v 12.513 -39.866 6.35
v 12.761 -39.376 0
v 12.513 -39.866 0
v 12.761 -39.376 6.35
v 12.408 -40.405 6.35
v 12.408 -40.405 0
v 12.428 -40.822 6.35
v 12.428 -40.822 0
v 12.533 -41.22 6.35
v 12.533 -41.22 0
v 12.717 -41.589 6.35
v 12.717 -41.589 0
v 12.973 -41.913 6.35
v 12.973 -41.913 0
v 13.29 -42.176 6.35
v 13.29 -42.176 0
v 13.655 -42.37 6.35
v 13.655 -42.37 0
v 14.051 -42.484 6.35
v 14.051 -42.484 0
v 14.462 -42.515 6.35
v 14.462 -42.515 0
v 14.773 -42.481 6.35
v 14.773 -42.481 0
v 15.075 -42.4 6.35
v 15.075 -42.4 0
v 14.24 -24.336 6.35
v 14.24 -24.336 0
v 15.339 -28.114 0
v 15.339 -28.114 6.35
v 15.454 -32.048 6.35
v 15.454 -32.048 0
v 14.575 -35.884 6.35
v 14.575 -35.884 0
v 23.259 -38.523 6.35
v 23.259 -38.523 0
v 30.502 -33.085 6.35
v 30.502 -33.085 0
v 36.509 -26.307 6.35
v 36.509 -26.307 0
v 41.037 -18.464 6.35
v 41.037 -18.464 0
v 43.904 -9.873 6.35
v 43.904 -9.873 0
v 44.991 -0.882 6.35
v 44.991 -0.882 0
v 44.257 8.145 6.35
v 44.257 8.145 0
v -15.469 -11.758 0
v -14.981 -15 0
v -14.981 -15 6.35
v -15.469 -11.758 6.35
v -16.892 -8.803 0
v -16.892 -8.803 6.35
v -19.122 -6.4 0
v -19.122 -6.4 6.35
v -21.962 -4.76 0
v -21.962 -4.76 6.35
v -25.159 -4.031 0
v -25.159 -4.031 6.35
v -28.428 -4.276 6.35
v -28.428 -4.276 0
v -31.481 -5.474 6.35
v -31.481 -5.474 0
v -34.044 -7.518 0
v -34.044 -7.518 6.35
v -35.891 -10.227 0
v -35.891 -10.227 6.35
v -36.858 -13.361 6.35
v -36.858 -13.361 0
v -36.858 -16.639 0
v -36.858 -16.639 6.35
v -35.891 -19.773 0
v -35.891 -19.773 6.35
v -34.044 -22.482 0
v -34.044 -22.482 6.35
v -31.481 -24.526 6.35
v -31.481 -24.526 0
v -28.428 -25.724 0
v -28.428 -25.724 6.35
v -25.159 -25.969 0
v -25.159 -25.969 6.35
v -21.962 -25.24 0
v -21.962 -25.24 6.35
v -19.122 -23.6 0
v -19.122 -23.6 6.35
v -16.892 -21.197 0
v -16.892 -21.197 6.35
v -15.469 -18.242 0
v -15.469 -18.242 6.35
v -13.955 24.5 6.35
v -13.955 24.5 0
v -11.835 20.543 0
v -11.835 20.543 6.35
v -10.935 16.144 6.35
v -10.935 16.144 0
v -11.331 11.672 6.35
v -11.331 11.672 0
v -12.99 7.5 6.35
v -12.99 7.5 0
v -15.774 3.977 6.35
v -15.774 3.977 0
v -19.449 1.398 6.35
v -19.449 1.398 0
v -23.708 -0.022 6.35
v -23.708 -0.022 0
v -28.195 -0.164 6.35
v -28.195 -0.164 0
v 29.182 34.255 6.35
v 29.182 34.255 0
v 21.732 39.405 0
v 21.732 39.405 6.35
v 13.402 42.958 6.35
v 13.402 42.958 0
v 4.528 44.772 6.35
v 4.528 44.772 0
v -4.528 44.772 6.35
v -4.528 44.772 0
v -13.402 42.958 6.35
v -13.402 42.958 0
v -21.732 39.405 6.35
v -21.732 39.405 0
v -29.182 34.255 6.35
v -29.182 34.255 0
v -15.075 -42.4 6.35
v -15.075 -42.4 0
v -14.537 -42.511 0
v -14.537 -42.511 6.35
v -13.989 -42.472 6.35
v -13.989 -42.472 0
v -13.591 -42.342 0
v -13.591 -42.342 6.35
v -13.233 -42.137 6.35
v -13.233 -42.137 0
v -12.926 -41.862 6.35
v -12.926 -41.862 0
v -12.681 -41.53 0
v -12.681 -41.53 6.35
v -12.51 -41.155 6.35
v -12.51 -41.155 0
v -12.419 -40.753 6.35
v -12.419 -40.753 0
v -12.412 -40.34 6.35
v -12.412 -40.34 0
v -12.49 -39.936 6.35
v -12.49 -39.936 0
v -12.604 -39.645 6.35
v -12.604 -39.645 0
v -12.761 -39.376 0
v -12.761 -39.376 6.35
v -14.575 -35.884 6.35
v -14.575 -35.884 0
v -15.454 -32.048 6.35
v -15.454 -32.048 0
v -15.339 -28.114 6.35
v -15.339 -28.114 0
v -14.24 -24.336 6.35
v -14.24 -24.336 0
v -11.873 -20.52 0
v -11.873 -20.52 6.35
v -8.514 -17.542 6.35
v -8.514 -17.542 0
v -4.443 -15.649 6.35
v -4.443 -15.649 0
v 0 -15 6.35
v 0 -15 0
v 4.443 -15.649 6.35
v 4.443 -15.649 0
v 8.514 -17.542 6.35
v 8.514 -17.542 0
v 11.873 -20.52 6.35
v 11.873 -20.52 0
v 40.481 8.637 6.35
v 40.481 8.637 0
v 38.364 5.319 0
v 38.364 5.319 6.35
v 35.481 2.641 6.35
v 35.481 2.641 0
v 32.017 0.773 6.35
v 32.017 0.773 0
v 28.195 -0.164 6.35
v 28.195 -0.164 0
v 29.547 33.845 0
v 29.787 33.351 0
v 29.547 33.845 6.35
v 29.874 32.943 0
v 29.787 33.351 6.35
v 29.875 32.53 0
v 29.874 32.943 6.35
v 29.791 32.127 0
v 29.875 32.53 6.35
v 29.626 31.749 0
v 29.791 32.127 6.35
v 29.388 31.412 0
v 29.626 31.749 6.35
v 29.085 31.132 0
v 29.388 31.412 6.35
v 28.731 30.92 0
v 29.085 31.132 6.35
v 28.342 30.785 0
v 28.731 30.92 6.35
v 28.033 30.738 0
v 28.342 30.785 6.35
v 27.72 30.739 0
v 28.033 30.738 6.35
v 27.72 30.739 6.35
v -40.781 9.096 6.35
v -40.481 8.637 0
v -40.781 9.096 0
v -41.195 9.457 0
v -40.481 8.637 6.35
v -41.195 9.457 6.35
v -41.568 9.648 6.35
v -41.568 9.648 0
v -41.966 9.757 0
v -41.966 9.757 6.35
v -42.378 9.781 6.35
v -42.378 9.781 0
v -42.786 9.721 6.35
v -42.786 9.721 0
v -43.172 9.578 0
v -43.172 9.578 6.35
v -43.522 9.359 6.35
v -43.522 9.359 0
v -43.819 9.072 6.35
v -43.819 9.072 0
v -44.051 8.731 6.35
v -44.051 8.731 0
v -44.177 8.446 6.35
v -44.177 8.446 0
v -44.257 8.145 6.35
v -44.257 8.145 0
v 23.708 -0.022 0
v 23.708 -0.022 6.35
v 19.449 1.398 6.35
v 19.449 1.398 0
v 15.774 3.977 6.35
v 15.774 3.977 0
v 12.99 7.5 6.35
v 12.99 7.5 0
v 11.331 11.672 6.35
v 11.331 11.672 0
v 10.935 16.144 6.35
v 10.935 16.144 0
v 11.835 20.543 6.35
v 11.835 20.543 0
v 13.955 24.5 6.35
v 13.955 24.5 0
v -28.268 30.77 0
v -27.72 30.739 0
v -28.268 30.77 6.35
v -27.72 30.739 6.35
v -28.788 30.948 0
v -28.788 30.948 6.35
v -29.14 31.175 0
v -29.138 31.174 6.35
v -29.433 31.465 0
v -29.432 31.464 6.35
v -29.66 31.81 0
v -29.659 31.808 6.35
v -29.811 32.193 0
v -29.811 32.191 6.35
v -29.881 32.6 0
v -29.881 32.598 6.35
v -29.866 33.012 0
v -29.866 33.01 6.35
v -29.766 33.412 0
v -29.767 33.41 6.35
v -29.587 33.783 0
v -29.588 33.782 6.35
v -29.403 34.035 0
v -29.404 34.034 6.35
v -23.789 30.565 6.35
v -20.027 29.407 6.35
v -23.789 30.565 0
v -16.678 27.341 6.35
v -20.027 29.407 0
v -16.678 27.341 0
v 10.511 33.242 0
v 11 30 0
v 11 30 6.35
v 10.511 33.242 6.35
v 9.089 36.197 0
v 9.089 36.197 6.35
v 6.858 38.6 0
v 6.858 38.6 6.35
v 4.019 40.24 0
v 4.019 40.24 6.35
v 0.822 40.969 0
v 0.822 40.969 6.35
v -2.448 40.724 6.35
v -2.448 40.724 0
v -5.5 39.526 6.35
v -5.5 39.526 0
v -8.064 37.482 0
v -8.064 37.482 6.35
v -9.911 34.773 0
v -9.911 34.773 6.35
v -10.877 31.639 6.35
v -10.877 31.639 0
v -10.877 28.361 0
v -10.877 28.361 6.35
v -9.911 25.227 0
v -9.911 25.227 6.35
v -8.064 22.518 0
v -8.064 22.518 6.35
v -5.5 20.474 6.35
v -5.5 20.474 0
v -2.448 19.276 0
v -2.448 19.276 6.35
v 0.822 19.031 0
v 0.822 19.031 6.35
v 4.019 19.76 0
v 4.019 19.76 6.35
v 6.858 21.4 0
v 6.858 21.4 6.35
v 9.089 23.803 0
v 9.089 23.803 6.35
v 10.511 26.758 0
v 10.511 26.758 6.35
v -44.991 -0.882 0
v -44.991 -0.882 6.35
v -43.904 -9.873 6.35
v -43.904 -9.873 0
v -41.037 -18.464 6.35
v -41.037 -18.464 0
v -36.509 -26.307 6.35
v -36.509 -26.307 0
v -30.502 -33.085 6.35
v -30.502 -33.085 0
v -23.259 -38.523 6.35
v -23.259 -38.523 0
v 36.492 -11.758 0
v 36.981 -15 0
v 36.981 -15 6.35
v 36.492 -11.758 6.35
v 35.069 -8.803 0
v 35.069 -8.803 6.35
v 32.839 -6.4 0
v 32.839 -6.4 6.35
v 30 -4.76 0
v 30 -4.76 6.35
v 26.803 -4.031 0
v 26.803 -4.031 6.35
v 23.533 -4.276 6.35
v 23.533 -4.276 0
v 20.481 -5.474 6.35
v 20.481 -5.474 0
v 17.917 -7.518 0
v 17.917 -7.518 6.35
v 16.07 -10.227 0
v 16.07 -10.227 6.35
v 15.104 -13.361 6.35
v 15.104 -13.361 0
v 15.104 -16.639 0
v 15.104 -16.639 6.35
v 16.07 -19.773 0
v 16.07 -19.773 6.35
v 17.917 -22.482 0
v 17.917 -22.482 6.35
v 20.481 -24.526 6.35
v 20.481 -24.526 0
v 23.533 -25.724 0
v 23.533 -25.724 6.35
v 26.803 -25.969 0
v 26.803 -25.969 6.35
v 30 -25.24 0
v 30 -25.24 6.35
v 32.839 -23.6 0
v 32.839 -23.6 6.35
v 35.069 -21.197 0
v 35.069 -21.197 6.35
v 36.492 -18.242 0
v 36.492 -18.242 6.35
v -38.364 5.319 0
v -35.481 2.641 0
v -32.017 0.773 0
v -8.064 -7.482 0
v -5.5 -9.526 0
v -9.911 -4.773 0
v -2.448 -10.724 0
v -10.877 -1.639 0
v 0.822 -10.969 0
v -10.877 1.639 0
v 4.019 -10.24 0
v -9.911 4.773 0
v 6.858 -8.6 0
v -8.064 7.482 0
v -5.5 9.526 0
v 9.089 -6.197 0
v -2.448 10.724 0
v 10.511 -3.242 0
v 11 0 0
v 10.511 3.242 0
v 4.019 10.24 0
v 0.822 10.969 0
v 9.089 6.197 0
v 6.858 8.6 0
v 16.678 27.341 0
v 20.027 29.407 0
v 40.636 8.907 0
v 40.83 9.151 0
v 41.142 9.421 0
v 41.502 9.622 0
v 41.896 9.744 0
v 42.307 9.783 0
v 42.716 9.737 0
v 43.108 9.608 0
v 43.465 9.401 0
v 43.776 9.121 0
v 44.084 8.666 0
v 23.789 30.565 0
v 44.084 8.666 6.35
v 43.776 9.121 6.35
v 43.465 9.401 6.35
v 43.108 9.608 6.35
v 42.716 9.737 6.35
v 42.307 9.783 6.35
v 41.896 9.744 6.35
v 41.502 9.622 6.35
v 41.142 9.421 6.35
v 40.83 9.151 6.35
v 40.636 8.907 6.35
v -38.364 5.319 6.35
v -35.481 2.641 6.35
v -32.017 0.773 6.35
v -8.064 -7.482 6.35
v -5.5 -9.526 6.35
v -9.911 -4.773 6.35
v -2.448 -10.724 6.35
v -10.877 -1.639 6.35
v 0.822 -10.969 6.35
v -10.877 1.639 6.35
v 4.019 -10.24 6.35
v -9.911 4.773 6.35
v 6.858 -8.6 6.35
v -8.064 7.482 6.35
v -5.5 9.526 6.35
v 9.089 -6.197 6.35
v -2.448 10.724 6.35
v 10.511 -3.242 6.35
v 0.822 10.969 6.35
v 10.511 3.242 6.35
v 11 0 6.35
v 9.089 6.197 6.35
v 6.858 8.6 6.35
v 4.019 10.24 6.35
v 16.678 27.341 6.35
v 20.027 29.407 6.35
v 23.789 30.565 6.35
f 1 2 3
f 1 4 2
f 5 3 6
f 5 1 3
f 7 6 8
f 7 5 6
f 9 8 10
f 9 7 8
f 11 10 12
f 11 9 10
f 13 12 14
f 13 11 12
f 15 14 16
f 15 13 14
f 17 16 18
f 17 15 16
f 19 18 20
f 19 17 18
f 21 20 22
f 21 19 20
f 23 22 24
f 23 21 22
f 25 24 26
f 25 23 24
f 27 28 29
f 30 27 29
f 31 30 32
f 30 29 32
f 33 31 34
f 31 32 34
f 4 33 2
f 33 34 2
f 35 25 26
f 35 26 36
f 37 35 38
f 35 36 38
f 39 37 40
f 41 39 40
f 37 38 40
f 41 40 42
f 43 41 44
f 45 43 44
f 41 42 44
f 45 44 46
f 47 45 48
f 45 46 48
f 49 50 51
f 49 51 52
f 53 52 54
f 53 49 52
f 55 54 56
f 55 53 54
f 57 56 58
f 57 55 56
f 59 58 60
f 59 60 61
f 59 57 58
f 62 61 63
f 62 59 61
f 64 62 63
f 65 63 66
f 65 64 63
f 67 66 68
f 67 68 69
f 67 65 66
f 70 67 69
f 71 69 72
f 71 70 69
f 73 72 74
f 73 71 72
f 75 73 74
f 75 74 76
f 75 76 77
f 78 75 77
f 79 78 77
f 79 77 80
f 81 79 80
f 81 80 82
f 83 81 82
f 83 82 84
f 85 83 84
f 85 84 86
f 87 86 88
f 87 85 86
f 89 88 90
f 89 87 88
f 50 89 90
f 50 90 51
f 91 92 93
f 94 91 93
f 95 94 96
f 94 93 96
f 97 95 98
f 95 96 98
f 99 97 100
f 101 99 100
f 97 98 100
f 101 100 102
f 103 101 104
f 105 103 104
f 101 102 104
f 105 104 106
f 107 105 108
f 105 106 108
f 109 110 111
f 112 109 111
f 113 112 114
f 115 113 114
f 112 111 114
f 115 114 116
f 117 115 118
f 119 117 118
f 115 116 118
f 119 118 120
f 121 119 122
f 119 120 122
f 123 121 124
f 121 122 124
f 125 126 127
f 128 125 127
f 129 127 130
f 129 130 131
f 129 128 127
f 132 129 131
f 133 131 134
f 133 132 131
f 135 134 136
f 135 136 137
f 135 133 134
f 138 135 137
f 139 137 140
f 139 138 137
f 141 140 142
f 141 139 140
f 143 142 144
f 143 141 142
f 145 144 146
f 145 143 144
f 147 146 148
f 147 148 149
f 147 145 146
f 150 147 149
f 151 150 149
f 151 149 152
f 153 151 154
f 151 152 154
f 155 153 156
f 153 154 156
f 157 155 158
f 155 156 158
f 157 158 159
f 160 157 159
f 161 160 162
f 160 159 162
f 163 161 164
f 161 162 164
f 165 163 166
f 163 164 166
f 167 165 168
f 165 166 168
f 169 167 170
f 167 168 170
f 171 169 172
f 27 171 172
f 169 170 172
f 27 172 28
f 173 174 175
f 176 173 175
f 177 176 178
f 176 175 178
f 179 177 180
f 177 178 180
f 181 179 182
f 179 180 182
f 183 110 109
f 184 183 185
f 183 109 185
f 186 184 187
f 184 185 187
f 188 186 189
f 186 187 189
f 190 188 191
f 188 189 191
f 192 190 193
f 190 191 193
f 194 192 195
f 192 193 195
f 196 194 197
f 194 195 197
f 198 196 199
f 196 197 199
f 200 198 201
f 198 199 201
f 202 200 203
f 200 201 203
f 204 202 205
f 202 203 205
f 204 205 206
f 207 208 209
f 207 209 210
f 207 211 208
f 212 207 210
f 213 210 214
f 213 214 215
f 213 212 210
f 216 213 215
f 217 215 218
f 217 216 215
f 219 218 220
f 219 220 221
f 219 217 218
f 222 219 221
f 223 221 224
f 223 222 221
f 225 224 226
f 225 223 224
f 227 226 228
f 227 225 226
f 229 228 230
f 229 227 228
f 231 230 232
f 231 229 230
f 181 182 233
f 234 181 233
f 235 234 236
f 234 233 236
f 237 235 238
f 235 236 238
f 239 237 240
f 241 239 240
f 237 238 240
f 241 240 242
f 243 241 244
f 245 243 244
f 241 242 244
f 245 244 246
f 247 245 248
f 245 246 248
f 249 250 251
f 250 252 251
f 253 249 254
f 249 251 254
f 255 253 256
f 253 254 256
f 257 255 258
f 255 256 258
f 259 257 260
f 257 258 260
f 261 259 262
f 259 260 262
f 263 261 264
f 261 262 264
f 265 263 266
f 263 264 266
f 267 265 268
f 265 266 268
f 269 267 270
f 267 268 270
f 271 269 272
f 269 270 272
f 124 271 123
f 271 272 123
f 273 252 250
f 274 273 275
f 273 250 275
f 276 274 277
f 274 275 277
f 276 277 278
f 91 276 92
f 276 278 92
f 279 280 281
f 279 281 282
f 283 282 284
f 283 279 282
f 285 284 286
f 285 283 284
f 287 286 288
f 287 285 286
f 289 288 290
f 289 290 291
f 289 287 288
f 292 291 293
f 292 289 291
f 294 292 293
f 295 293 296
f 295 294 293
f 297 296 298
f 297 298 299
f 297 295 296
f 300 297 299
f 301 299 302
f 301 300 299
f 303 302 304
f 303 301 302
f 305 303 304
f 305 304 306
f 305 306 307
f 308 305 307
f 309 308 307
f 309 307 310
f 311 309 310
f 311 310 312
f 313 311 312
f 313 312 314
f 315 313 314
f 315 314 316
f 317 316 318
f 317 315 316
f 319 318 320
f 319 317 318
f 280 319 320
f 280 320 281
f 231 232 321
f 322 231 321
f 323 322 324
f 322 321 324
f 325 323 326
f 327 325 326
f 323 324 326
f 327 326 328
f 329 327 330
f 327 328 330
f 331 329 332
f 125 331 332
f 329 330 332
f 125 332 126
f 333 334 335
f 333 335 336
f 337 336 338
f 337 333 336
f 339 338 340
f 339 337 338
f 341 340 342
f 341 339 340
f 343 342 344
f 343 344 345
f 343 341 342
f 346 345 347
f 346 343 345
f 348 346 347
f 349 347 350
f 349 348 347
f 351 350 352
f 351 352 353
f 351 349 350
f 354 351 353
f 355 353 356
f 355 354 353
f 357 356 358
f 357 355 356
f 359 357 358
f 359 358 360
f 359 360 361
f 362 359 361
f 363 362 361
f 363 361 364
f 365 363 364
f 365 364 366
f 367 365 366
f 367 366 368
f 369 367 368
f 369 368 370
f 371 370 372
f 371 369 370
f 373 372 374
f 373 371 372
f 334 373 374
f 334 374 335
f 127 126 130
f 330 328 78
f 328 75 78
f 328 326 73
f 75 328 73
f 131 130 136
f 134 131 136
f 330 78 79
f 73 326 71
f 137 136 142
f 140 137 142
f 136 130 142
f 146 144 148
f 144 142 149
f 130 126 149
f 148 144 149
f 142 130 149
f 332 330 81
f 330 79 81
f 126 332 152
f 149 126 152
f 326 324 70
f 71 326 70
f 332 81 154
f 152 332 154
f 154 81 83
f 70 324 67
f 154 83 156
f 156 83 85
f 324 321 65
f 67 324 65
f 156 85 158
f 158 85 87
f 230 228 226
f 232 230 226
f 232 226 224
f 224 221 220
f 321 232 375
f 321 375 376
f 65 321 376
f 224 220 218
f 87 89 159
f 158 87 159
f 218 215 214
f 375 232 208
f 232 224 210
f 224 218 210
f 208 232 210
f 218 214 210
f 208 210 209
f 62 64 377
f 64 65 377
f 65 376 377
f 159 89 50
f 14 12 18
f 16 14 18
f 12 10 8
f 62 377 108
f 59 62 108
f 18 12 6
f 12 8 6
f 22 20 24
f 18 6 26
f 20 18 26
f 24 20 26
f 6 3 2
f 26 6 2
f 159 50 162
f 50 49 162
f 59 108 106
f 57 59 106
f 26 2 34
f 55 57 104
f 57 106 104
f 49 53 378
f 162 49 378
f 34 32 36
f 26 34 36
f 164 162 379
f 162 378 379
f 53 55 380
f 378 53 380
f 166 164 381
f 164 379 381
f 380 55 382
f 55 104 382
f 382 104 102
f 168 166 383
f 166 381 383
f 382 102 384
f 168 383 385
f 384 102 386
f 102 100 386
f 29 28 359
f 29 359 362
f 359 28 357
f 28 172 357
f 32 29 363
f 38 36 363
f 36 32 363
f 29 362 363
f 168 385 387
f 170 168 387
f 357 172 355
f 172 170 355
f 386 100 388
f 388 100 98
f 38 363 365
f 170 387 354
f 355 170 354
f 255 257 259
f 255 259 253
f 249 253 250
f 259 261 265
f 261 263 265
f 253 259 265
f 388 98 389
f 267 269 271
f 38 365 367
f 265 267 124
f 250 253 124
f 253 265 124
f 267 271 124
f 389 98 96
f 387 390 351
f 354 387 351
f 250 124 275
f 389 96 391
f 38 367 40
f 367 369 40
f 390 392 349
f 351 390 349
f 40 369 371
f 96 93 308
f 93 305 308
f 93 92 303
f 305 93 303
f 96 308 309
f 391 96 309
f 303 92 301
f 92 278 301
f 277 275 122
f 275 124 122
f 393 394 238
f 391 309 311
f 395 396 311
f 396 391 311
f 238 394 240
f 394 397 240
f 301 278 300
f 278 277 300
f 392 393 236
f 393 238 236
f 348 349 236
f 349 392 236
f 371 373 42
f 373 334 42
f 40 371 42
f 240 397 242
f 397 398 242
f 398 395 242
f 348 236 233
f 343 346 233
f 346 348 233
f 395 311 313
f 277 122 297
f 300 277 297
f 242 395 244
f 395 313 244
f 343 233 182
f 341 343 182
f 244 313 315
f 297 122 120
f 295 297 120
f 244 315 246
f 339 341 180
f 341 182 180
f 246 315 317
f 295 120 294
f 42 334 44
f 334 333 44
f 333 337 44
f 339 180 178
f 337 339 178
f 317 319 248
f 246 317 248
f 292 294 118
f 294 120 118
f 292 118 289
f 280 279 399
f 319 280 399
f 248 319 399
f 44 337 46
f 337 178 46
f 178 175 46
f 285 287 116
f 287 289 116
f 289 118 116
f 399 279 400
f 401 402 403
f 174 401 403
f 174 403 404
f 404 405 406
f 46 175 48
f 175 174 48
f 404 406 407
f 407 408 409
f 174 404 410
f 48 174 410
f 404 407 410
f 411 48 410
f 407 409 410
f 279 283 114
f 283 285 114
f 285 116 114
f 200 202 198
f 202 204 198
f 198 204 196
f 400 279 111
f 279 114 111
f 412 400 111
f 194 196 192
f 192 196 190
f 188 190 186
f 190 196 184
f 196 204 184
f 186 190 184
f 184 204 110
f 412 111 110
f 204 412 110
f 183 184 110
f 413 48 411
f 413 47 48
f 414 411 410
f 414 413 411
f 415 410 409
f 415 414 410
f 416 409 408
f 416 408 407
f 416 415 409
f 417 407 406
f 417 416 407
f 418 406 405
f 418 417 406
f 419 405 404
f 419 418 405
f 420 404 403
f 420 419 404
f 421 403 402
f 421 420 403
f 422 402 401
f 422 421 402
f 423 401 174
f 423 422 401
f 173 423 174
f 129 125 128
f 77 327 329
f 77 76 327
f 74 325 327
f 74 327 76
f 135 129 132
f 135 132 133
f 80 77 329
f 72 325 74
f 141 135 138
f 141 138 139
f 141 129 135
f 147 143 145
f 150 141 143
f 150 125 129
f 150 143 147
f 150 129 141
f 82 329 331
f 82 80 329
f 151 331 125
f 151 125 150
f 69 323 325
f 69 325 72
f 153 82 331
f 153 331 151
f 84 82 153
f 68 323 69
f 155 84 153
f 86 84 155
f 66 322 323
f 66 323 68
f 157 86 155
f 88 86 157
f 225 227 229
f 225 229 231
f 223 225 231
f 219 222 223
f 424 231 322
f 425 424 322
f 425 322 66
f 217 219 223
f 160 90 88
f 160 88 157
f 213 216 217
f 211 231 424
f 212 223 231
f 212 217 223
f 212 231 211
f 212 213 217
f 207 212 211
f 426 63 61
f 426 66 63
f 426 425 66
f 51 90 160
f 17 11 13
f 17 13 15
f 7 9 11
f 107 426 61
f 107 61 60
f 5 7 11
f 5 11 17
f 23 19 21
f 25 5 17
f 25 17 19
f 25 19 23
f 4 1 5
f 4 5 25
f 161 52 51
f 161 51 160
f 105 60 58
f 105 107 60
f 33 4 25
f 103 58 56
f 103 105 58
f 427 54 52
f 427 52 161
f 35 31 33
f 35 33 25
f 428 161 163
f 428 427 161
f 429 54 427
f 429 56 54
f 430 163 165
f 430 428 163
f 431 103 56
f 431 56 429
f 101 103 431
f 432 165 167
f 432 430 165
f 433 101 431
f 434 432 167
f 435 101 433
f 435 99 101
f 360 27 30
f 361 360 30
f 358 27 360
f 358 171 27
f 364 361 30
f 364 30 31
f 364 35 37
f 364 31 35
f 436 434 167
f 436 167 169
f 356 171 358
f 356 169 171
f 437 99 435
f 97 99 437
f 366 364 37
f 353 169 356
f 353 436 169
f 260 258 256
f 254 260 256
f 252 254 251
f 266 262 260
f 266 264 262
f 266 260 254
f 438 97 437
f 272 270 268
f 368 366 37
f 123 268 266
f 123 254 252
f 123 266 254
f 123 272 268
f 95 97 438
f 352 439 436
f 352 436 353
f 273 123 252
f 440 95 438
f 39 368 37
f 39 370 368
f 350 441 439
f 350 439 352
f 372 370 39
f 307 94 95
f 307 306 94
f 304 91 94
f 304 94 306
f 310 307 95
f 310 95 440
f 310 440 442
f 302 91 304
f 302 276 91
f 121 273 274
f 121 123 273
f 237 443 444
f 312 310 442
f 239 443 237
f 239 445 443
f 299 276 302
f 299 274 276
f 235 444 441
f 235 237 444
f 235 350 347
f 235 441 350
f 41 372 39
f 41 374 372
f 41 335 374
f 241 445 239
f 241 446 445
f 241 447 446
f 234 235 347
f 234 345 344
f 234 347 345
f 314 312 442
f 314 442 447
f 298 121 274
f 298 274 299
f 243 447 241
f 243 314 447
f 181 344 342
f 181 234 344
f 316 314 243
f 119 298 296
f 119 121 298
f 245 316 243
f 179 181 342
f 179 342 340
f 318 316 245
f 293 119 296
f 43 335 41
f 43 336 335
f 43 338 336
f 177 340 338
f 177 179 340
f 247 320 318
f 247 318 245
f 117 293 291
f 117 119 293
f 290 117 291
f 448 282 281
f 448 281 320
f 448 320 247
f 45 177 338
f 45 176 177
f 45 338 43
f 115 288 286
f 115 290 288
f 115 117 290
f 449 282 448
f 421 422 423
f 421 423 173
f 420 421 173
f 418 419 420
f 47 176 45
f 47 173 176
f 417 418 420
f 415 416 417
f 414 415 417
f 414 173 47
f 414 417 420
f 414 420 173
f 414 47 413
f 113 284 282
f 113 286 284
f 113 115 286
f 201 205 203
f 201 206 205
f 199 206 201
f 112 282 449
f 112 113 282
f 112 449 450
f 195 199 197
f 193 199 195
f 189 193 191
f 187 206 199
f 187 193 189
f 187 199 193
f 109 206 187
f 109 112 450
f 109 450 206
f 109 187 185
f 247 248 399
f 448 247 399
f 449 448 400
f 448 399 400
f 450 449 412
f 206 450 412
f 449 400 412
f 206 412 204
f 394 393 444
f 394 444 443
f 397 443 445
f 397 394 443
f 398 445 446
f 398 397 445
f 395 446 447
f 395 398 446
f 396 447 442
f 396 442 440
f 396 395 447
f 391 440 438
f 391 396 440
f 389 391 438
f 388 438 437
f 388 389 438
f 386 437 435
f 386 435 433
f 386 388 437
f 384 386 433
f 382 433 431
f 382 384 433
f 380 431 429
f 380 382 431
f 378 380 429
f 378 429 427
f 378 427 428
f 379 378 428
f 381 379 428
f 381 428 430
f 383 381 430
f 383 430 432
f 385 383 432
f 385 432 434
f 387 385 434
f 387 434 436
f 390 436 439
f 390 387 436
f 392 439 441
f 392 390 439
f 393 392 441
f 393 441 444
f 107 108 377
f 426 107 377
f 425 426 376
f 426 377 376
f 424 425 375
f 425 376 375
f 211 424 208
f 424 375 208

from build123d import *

# Parameters (mm, degrees)
F0_R     = 11
F1_DEPTH = 6.35
F2_R     = 2


with BuildPart() as f1:
    # F0 (on Top) → F1 (new body)
    with BuildSketch(Plane.XY):
        with BuildLine():
            ThreePointArc((-28.195265, -0.164368), (-38.373827, 5.331046), (-41.929181, 16.338414))
            ThreePointArc((-41.929181, 16.338414), (-38.971143, -22.5), (-6.815109, -44.480943))
            ThreePointArc((-6.815109, -44.480943), (-14.570092, -35.898232), (-14.23998, -24.335632))
            ThreePointArc((-14.23998, -24.335632), (0, -15), (14.23998, -24.335632))
            ThreePointArc((14.23998, -24.335632), (14.570092, -35.898232), (6.815109, -44.480943))
            ThreePointArc((6.815109, -44.480943), (38.971143, -22.5), (41.929181, 16.338414))
            ThreePointArc((41.929181, 16.338414), (38.373827, 5.331046), (28.195265, -0.164368))
            ThreePointArc((28.195265, -0.164368), (12.990381, 7.5), (13.955286, 24.5))
            ThreePointArc((13.955286, 24.5), (23.803735, 30.567186), (35.114072, 28.142529))
            ThreePointArc((35.114072, 28.142529), (0, 45), (-35.114072, 28.142529))
            ThreePointArc((-35.114072, 28.142529), (-23.803735, 30.567186), (-13.955286, 24.5))
            ThreePointArc((-13.955286, 24.5), (-12.990381, 7.5), (-28.195265, -0.164368))
        make_face()
        with Locations((-25.980762, -15)):
            Circle(F0_R, mode=Mode.SUBTRACT)
        Circle(F0_R, mode=Mode.SUBTRACT)
        with Locations((25.980762, -15)):
            Circle(F0_R, mode=Mode.SUBTRACT)
        with Locations((0, 30)):
            Circle(F0_R, mode=Mode.SUBTRACT)
    extrude(amount=F1_DEPTH)

    # F2
    f2_edges = [f1.edges().sort_by_distance(p)[0] for p in [
        (6.815109, -44.480943, 3.175),
        (-6.815109, -44.480943, 3.175),
        (-41.929181, 16.338414, 3.175),
        (-35.114072, 28.142529, 3.175),
        (35.114072, 28.142529, 3.175),
        (41.929181, 16.338414, 3.175),
    ]]
    fillet(f2_edges, radius=F2_R)


solid = f1.part
